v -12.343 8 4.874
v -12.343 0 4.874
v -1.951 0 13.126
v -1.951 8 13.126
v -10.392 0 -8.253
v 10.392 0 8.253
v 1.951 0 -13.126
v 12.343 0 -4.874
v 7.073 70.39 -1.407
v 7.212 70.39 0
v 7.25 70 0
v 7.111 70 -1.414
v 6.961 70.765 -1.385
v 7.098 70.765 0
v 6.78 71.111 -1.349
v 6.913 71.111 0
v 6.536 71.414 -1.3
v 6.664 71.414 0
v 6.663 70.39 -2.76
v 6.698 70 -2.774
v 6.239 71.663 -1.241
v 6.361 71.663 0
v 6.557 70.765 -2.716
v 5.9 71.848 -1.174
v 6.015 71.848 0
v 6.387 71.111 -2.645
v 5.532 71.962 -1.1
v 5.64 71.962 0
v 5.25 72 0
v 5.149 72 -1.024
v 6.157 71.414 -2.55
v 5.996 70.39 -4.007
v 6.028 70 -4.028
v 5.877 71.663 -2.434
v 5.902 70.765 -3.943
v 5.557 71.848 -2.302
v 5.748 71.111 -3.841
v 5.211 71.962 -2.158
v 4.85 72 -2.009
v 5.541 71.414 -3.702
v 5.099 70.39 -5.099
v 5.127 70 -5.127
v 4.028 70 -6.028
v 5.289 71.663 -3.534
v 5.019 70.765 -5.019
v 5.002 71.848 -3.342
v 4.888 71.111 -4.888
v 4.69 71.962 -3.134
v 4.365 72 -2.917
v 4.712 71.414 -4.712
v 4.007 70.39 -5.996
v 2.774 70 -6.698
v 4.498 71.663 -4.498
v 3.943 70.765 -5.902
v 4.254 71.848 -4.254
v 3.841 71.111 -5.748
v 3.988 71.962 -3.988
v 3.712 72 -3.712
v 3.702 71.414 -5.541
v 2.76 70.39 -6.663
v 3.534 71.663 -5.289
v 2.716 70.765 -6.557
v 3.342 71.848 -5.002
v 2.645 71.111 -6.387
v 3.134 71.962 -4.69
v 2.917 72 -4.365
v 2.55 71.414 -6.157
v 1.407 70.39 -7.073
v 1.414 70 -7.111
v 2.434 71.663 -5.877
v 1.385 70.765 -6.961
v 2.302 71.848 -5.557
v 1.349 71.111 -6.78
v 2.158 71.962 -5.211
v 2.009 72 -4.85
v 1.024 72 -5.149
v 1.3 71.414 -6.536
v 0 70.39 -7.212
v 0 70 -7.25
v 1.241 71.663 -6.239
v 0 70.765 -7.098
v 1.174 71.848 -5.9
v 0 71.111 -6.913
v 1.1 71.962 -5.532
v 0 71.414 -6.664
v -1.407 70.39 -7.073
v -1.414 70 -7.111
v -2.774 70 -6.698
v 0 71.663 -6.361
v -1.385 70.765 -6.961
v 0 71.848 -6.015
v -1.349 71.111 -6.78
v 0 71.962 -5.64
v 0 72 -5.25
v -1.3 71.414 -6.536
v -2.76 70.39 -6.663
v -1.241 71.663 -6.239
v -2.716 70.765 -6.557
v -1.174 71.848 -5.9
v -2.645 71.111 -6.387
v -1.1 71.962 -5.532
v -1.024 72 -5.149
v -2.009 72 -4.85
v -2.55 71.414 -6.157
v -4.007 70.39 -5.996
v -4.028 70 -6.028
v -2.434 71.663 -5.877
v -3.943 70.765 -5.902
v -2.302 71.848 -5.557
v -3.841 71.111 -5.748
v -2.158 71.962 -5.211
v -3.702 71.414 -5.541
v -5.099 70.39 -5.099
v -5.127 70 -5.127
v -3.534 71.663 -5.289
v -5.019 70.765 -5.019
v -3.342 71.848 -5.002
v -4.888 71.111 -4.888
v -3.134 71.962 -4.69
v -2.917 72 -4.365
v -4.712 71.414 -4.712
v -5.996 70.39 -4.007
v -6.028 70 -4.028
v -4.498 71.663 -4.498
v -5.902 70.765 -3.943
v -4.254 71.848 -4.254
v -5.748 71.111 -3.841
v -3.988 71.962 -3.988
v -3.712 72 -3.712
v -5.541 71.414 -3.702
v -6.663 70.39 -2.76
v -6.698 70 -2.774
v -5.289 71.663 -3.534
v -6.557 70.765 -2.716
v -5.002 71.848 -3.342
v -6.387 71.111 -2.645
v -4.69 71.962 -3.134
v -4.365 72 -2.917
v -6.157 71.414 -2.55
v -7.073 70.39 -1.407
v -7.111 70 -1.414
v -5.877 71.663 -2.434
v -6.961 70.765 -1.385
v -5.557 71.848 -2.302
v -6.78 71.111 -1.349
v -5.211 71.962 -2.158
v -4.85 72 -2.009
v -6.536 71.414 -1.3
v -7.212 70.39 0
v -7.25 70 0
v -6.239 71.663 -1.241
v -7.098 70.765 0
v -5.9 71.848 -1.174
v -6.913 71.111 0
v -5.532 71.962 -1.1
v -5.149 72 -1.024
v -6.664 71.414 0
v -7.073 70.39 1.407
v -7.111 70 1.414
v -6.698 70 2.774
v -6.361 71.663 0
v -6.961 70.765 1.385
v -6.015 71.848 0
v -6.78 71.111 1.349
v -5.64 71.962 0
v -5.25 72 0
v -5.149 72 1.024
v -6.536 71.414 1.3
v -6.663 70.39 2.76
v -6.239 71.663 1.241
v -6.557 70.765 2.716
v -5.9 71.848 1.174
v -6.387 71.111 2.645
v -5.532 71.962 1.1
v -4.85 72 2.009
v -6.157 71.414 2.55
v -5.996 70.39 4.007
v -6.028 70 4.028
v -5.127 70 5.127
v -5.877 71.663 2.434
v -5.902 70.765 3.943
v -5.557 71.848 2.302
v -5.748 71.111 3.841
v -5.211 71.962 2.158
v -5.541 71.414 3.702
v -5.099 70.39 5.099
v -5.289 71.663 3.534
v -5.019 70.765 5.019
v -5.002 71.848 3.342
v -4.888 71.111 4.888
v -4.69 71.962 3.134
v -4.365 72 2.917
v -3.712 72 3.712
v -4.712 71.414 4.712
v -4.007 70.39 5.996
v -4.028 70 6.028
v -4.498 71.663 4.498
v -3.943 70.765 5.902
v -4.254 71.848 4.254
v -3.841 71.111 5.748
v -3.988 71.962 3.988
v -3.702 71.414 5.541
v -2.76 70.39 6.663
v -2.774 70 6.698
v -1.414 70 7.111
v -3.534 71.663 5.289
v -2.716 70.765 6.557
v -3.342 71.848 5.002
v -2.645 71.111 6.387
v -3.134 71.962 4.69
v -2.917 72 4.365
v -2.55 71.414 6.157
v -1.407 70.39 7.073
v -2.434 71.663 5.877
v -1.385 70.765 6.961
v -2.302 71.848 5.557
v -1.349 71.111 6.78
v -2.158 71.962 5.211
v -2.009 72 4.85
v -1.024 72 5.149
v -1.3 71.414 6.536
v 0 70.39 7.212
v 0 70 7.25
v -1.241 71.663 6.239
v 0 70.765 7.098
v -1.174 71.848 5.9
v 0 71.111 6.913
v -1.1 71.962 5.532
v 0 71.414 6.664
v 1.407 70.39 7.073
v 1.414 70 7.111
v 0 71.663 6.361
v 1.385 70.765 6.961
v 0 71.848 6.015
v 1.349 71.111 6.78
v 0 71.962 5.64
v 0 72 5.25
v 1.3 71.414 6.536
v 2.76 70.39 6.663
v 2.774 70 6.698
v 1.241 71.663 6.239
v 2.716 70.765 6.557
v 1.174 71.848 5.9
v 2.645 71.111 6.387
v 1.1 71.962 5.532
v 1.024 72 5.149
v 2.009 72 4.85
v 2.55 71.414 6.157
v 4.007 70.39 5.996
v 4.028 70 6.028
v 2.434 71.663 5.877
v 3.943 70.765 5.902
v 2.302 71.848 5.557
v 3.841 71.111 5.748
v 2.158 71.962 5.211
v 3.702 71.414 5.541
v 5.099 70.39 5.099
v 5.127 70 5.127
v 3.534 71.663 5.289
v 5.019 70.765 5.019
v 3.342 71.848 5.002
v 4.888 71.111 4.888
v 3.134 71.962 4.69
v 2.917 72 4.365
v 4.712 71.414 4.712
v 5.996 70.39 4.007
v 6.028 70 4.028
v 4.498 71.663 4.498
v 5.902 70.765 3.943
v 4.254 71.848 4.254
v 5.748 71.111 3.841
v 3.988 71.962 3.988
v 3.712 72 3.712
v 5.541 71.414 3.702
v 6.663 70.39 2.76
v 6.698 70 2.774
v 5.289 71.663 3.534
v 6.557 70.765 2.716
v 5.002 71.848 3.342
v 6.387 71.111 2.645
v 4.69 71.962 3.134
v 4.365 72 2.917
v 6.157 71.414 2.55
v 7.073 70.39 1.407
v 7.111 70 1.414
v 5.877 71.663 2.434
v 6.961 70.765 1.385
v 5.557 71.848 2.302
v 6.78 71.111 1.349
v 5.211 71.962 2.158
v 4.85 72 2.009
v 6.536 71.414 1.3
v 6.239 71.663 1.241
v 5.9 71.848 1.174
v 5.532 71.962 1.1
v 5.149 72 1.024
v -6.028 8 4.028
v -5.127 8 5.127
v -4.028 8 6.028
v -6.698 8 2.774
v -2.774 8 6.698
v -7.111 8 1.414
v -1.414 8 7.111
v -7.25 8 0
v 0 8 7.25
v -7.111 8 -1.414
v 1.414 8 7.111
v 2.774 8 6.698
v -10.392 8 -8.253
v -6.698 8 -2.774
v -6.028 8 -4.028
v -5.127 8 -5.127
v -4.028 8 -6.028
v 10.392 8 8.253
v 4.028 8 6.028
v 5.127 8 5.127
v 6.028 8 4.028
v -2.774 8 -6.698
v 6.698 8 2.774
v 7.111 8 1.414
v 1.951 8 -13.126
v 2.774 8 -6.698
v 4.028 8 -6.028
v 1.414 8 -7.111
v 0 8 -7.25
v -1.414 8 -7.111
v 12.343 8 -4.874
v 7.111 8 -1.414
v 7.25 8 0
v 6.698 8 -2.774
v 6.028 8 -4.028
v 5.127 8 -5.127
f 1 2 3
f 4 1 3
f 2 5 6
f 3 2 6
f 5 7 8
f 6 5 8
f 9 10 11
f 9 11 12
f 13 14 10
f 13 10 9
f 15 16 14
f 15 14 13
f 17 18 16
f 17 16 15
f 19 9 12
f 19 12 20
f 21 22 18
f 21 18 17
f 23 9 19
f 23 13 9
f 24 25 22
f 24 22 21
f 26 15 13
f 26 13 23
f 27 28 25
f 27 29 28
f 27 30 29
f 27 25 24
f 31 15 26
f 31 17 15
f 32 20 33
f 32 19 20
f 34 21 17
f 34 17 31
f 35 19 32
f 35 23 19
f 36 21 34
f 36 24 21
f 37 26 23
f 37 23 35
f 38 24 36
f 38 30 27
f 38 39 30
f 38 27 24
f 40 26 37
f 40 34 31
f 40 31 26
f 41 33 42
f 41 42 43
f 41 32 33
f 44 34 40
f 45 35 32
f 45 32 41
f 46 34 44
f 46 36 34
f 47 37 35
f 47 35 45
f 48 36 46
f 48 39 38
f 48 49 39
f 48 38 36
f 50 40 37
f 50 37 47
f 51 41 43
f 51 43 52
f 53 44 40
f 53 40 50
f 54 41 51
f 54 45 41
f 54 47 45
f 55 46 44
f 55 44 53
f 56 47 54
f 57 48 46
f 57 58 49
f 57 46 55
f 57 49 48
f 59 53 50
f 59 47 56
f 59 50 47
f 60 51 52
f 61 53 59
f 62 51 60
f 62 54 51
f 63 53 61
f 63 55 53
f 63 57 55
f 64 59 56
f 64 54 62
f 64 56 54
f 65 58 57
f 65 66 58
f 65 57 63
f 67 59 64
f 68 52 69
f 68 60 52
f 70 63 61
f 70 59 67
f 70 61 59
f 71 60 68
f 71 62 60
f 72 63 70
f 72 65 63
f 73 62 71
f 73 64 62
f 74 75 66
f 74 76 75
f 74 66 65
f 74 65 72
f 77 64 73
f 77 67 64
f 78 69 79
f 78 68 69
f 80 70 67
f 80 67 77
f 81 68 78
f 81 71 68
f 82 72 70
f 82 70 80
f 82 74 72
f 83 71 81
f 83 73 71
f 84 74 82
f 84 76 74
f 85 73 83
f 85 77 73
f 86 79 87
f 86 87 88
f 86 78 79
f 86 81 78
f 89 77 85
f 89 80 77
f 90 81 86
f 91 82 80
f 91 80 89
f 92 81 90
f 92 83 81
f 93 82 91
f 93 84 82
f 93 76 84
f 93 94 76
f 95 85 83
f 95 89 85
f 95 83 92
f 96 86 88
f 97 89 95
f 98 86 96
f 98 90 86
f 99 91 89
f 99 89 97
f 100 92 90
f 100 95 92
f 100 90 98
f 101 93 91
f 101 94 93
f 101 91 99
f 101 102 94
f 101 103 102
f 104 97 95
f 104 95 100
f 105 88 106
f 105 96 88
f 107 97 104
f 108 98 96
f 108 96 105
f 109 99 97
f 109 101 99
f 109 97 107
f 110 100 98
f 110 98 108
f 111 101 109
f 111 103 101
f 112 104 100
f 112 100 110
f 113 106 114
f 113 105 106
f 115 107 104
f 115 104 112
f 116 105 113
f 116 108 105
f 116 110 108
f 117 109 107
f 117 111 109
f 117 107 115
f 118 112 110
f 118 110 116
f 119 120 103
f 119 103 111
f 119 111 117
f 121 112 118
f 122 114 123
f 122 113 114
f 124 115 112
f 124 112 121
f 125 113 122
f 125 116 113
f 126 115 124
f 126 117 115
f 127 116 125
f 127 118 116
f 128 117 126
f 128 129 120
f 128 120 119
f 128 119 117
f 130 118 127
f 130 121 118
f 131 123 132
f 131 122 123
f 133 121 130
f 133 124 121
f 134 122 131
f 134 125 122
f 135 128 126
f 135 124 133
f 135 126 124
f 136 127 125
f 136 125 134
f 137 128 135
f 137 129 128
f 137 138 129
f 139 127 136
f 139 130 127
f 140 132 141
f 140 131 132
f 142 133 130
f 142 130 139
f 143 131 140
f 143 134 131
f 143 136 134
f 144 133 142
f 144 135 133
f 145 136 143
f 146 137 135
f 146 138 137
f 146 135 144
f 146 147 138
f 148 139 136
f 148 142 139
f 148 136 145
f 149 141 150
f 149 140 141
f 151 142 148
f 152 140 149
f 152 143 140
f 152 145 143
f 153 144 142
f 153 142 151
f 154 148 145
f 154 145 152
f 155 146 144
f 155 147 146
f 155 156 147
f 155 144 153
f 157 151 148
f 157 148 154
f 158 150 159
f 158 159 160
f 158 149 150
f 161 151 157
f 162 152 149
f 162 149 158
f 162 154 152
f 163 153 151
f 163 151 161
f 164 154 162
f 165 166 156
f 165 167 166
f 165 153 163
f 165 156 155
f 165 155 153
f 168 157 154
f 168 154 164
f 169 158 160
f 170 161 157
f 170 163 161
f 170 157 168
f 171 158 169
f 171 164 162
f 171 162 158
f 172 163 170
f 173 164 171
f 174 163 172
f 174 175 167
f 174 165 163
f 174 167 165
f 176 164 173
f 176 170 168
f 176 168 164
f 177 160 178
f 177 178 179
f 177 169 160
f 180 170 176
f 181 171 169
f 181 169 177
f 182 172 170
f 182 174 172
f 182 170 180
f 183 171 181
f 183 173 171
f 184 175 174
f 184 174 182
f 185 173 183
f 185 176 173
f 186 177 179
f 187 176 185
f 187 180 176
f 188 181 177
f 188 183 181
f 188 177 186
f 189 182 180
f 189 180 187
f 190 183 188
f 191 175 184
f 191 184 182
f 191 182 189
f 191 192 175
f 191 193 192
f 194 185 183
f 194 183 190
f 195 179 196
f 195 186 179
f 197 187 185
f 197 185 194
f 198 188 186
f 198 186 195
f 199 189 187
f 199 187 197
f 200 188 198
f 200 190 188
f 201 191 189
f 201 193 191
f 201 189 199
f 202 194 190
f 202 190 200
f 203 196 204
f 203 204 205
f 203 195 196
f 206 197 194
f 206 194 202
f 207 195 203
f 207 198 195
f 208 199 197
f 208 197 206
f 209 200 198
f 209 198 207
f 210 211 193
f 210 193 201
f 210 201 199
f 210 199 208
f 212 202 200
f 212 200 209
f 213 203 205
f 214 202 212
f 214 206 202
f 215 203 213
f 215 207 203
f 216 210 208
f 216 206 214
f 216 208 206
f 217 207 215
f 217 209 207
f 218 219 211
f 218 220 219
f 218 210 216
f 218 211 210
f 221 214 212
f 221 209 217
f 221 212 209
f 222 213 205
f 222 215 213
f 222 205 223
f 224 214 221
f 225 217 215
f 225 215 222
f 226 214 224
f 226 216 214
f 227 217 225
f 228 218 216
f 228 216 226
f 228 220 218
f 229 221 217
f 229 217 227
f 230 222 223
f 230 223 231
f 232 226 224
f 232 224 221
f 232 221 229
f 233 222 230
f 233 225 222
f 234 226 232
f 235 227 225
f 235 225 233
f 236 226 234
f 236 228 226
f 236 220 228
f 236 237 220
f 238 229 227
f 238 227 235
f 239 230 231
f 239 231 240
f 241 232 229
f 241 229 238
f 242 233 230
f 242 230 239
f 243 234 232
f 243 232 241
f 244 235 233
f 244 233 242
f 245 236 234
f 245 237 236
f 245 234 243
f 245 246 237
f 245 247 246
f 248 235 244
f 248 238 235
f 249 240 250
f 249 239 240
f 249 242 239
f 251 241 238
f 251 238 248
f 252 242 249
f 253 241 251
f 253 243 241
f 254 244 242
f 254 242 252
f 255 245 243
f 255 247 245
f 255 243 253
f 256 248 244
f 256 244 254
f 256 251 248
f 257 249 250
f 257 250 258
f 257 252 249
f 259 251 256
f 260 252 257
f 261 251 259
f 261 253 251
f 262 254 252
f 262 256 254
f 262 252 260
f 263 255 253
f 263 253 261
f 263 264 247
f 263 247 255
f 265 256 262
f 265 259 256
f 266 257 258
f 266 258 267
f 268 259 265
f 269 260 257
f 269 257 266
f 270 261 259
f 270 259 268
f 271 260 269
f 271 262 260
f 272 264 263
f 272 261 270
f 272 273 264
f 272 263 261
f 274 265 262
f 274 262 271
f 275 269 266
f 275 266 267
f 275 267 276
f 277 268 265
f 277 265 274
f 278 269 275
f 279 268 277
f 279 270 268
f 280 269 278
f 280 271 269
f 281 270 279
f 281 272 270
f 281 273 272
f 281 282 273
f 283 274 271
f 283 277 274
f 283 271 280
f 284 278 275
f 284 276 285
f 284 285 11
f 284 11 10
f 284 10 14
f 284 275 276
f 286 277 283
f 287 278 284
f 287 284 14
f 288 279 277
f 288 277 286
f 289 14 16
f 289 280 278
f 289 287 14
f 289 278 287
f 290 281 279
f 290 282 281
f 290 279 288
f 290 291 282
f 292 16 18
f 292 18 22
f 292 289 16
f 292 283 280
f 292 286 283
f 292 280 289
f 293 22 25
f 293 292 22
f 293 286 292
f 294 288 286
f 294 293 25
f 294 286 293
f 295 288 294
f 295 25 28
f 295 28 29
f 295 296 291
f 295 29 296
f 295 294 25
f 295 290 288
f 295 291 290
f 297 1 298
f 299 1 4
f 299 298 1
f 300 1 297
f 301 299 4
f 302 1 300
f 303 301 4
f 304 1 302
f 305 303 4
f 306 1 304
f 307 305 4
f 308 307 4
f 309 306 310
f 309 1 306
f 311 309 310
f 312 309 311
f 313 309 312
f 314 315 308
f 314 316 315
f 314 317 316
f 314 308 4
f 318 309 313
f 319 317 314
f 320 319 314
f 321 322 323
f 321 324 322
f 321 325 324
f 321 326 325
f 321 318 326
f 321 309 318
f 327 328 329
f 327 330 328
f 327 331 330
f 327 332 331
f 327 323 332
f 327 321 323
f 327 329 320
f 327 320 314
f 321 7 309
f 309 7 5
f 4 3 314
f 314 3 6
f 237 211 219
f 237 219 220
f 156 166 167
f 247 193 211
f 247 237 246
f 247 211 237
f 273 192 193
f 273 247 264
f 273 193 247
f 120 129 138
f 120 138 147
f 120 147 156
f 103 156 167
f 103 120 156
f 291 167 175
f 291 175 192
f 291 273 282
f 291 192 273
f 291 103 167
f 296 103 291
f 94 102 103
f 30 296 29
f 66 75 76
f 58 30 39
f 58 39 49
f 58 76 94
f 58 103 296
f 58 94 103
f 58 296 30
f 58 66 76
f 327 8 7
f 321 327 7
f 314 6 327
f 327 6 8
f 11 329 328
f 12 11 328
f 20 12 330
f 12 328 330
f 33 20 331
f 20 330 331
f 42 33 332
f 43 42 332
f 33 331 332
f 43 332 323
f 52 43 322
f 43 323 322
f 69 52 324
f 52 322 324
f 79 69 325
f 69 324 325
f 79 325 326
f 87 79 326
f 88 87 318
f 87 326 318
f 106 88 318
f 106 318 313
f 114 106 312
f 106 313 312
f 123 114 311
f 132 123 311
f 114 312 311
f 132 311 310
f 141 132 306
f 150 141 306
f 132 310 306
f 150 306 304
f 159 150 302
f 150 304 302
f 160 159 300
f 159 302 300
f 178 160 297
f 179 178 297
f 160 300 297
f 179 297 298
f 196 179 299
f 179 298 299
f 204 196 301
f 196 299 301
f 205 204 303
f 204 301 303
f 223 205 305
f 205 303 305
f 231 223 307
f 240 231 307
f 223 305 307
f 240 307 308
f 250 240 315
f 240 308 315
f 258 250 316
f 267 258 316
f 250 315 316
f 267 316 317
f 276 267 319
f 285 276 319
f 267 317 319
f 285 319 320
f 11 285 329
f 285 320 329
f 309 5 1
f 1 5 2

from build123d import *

# Parameters (mm, degrees)
BOSS_EXTRU_1_DEPTH = 8
ESQUISSE2_R        = 7.25
BOSS_EXTRU_2_DEPTH = 64
CONG_1_R           = 2


with BuildPart() as part:
    # Esquisse1 → Boss.-Extru.1 (new body)
    with BuildSketch(Plane(origin=(0, 0, 0), x_dir=(1, 0, 0), z_dir=(0, 1, 0))):
        Polygon((-10.392304845, 8.252712671), (-12.343211246, -4.873643664), (-1.950906401, -13.126356336), (10.392304845, -8.252712671), (12.343211246, 4.873643664), (1.950906401, 13.126356336), align=None)
    extrude(amount=BOSS_EXTRU_1_DEPTH)

    # Esquisse2 → Boss.-Extru.2 (add)
    with BuildSketch(Plane(origin=(0, 8, 0), x_dir=(1, 0, 0), z_dir=(0, 1, 0))):
        Circle(ESQUISSE2_R)
    extrude(amount=BOSS_EXTRU_2_DEPTH)

    # Congé1
    cong_1_edges = [part.edges().sort_by_distance(p)[0] for p in [
        (-7.25, 72, 0),
    ]]
    fillet(cong_1_edges, radius=CONG_1_R)


solid = part.part
